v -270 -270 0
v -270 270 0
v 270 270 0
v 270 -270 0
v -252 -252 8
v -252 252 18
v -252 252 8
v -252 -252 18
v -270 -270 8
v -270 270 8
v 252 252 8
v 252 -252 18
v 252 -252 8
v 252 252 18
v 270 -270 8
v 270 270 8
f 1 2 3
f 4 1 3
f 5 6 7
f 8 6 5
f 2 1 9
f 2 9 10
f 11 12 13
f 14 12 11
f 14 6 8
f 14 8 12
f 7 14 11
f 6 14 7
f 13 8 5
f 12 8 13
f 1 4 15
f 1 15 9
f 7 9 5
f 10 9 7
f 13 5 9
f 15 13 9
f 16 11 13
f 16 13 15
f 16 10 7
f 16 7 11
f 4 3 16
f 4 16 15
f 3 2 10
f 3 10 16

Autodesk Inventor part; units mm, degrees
ref_plane "YZ Plane" through (0, 0, 0) normal (1, 0, 0) x (0, 1, 0)
ref_plane "XZ Plane" through (0, 0, 0) normal (0, 1, 0) x (-1, 0, 0)
ref_plane "Arbeitsebene3" through (-858.9244, 0, 0) normal (0, 0, 1) x (1, 0, 0)
sketch "Skizze2" plane through (-858.9244, 0, 0) normal (0, 0, 1) x (1, 0, 0)
  line L0 (588.9244, 270) -> (1128.9244, 270)
  line L1 (1128.9244, 270) -> (1128.9244, -270)
  line L2 (1128.9244, -270) -> (588.9244, -270)
  line L3 (588.9244, -270) -> (588.9244, 270)
  line L4 (480.9244, 0) -> (1236.9244, 0) projected
  line L5 (858.9244, -378) -> (858.9244, 378) projected
  point P0 (858.9244, 0)
  dimension "d5" = 540
  dimension "d6" = 540
extrude "Extrusion2" add sketch "Skizze2" along normal blind 18
sketch "Skizze3" plane through (-858.9244, 0, 18) normal (0, 0, 1) x (1, 0, 0)
  line L0 (1128.9244, 270) -> (588.9244, 270) projected
  line L1 (588.9244, 270) -> (588.9244, -270) projected
  line L2 (588.9244, -270) -> (1128.9244, -270) projected
  line L3 (1128.9244, -270) -> (1128.9244, 270) projected
  line L4 (1110.9244, 252) -> (606.9244, 252)
  line L5 (606.9244, 252) -> (606.9244, -252)
  line L6 (606.9244, -252) -> (1110.9244, -252)
  line L7 (1110.9244, -252) -> (1110.9244, 252)
  point P0 (858.9244, 0)
  dimension "d12" = 18
  dimension "d13" = 18
  dimension "d14" = 18
  dimension "d15" = 18
extrude "Extrusion3" cut sketch "Skizze3" against normal blind 10
properties part number "Boden"
